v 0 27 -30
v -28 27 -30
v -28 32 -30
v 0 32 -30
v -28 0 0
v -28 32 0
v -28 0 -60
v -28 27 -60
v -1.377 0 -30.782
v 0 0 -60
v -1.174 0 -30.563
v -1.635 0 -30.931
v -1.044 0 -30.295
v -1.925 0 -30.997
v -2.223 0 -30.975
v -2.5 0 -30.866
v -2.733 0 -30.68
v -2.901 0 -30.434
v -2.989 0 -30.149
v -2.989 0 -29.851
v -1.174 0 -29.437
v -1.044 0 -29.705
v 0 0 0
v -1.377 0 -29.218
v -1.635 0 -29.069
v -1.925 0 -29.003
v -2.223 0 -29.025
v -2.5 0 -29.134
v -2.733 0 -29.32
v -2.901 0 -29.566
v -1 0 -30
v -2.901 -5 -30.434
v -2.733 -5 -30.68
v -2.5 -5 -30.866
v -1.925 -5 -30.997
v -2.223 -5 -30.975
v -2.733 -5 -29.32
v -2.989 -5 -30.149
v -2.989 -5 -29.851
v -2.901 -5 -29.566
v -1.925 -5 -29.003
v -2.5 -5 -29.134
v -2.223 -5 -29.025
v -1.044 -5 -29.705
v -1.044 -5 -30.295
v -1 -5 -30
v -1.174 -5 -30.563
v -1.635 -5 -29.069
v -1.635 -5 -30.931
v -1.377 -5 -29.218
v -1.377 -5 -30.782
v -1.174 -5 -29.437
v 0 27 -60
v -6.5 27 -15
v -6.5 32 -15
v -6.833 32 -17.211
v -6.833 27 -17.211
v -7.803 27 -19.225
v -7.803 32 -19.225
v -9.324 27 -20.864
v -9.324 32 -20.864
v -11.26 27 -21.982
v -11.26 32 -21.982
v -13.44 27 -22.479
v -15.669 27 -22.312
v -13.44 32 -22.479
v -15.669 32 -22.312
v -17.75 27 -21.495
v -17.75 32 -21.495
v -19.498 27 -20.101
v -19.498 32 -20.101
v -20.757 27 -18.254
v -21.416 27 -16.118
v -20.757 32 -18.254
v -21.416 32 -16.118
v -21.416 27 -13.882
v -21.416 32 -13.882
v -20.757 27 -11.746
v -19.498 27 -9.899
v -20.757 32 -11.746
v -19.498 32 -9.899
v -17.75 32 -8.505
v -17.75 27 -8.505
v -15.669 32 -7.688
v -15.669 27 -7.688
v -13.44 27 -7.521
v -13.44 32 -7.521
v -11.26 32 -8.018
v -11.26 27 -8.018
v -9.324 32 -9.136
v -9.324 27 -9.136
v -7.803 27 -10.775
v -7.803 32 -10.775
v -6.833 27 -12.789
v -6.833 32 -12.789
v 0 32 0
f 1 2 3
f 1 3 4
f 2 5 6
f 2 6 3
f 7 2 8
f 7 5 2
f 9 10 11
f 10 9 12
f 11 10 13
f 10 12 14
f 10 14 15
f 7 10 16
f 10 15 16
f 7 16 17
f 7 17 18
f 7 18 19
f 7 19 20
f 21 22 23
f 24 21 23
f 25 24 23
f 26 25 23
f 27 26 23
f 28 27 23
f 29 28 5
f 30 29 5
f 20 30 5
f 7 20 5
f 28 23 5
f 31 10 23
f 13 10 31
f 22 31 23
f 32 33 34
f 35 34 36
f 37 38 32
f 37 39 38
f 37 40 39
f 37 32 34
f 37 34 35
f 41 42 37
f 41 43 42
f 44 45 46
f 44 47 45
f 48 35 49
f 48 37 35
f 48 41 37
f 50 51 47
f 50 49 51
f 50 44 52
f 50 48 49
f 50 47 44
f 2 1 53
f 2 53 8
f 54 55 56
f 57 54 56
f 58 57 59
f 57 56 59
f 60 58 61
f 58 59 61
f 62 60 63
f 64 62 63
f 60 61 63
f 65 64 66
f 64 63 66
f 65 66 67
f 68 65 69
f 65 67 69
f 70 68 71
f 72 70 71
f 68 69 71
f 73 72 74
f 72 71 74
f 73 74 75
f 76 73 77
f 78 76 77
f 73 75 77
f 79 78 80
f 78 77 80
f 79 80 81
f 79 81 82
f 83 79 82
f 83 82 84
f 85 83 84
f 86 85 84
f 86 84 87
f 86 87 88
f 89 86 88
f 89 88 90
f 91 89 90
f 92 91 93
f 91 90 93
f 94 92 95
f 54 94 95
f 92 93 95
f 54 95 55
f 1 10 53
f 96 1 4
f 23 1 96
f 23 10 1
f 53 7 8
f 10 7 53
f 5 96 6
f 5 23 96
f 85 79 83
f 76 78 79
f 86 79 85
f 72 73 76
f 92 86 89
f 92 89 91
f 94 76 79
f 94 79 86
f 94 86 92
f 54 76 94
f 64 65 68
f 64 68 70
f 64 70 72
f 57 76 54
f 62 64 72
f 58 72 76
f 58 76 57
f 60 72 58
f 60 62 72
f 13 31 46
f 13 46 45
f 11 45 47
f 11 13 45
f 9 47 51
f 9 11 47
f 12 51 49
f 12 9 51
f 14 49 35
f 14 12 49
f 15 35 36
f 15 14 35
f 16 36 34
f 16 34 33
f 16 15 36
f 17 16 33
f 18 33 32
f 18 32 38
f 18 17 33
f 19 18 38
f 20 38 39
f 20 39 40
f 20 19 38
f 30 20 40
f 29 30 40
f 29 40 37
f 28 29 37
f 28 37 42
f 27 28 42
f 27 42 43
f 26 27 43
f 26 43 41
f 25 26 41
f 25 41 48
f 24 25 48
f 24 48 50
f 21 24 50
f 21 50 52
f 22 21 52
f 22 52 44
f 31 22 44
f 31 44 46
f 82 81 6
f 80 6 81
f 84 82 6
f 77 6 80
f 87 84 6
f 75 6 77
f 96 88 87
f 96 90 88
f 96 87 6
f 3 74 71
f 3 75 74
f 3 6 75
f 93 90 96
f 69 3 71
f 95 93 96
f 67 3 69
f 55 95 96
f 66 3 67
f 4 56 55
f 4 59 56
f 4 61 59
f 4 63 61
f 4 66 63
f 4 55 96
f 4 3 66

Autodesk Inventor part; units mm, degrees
ref_plane "YZ Plane" through (0, 0, 0) normal (1, 0, 0) x (0, 1, 0)
ref_plane "XZ Plane" through (0, 0, 0) normal (0, 1, 0) x (-1, 0, 0)
ref_plane "XY Plane" through (0, 0, 0) normal (0, 0, 1) x (1, 0, 0)
sketch "Sketch1" plane through (0, 0, 0) normal (0, 1, 0) x (-1, 0, 0)
  line L0 (0, 0) -> (28, 0)
  line L1 (28, 0) -> (28, -60)
  line L2 (28, -60) -> (0, -60)
  line L3 (0, -60) -> (0, 0)
  dimension "d0" = 60
  dimension "d1" = 28
extrude "Extrusion1" add sketch "Sketch1" along normal blind 27
sketch "Sketch2" plane through (0, 27, 0) normal (0, 1, 0) x (1, 0, 0)
  line L0 (0, 0) -> (0, 60) projected
  line L1 (0, 0) -> (-28, 0)
  line L2 (-28, 0) -> (-28, 30)
  line L3 (-28, 30) -> (0, 30)
  line L4 (0, 30) -> (0, 0)
  line L5 (-28, 60) -> (-28, 0) projected
  dimension "d4" = 30
extrude "Extrusion2" add sketch "Sketch2" along normal blind 5
sketch "Sketch3" plane through (0, 32, 0) normal (0, 1, 0) x (1, 0, 0)
  circle A0 centre (-14, 15) radius 7.5
  line L0 (0, 30) -> (-28, 30) construction
  line L1 (-28, 0) -> (0, 0) construction
  line L2 (0, 0) -> (0, 30) construction
  line L3 (0, 30) -> (-28, 30) construction
  line L4 (-28, 30) -> (-28, 0) construction
  line L5 (-28, 0) -> (0, 0) construction
  line L6 (-28, 30) -> (-28, 0) construction
  line L7 (-14, 0) -> (-14, 30) construction
  line L8 (-28, 15) -> (0, 15) construction
  line L9 (0, 60) -> (0, 0) construction
  point P0 (-14, 15)
  point P1 (-14, 15)
  dimension "d7" = 15
extrude "Extrusion3" cut sketch "Sketch3" against normal blind 5
sketch "Sketch4" plane through (0, 0, 0) normal (0, -1, 0) x (1, 0, 0)
  circle A0 centre (-2, -30) radius 1
  line L0 (0, -60) -> (0, 0) projected
  line L1 (0, -30) -> (0, -60) projected
  line L2 (0, -30) -> (-52.148, -30)
  line L3 (0, -30) -> (-28, -30) projected
  dimension "d10" = 2
  dimension "d11" = 2
extrude "Extrusion4" add sketch "Sketch4" along normal blind 5
sketch "Sketch5" plane through (-2, -5, -30) normal (0, -1, 0) x (1, 0, 0)
  circle A0 centre (0, 0) radius 1 projected
  point P0 (2, 30)
properties part number "camera"
